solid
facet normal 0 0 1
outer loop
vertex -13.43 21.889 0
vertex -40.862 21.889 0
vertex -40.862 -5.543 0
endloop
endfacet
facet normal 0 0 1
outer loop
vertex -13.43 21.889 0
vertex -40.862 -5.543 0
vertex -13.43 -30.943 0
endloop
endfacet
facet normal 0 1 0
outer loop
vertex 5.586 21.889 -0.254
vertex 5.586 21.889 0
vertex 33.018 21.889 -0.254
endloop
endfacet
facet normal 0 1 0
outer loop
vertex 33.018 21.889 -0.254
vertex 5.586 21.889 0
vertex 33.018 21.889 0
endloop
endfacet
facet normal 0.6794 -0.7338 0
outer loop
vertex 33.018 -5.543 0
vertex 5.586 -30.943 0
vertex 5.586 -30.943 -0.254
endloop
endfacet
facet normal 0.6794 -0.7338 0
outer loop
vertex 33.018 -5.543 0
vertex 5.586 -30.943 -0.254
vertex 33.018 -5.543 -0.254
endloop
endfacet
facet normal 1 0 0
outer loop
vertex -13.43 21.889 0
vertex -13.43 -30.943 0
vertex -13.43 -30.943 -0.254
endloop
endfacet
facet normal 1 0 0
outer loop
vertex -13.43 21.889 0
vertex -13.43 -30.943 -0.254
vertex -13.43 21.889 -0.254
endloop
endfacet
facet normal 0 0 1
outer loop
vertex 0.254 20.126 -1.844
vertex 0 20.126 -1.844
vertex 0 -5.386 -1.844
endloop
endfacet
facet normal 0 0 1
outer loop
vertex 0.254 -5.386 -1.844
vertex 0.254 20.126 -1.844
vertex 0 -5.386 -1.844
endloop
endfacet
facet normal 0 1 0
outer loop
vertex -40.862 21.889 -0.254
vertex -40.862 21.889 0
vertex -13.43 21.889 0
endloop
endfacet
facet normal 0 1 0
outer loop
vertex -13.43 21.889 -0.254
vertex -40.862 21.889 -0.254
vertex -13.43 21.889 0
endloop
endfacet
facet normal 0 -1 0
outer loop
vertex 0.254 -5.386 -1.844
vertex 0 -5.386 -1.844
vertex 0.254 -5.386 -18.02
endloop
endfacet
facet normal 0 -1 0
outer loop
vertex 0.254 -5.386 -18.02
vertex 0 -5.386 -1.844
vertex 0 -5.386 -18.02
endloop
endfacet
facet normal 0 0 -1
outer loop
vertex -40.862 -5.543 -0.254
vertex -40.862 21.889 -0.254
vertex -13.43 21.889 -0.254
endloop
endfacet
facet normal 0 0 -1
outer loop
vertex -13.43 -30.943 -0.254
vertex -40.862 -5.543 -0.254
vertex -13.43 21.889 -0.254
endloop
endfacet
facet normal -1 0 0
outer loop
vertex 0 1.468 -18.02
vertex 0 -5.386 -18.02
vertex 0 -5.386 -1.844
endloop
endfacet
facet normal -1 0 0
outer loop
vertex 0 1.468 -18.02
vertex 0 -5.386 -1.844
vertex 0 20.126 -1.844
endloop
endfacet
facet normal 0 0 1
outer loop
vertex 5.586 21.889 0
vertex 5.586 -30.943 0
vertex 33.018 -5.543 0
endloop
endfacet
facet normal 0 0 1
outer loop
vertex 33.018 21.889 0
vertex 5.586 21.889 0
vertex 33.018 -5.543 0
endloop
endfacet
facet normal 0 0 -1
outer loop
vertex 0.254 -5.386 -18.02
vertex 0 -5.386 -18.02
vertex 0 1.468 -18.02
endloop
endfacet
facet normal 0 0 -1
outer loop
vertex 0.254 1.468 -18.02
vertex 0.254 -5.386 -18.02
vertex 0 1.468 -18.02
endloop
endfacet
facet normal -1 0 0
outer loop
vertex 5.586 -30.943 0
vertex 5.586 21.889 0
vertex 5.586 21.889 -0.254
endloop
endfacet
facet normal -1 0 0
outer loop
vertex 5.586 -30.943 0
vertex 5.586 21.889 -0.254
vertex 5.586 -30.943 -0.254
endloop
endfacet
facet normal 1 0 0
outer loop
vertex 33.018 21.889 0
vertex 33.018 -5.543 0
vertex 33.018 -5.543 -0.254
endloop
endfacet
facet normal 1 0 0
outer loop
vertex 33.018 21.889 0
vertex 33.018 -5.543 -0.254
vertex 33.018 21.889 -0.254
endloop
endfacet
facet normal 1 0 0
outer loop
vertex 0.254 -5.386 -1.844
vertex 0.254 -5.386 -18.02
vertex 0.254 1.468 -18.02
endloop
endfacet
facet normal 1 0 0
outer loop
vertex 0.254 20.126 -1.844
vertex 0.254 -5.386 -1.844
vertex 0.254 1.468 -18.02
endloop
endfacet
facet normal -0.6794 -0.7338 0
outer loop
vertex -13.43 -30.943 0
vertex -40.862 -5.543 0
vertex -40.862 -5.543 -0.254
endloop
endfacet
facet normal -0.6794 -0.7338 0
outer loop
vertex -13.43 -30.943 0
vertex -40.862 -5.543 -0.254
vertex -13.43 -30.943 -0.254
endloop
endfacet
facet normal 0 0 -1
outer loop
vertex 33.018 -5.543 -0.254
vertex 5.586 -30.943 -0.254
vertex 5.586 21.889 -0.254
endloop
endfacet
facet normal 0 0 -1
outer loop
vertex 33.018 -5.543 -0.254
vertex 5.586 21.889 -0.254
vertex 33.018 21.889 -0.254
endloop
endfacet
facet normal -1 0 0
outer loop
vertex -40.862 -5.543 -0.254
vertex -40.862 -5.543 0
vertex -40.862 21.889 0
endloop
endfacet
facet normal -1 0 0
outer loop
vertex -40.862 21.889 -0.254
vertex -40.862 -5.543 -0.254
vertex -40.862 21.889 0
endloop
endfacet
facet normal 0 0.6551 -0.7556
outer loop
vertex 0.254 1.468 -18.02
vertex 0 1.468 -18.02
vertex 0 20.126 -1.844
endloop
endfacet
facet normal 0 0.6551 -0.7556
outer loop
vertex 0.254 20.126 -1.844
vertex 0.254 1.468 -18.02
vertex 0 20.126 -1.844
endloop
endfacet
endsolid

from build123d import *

# Parameters (mm, degrees)
F0_W     = 27.432
F0_H     = 27.432
F1_DEPTH = 0.254
F3_DEPTH = 0.254


with BuildPart() as f1:
    # F0 (on Top) → F1 (new body)
    with BuildSketch(Plane.XY):
        with Locations((-27.145754, 8.172617)):
            Rectangle(F0_W, F0_H)
        Polygon((-13.429754, -5.543383), (-40.861754, -5.543383), (-13.429754, -30.943383), align=None)
        with Locations((19.302111, 8.172617)):
            Rectangle(F0_W, F0_H)
        Polygon((33.018111, -5.543383), (5.586111, -5.543383), (5.586111, -30.943383), (19.302111, -18.243383), align=None)
    extrude(amount=-F1_DEPTH)


with BuildPart() as f3:
    # F2 (on Right) → F3 (new body)
    with BuildSketch(Plane.YZ):
        Polygon((20.12627, -1.843953), (-5.386352, -1.843953), (-5.386352, -18.020494), (1.467636, -18.020494), align=None)
    extrude(amount=F3_DEPTH)


solid = Compound([f1.part, f3.part])
